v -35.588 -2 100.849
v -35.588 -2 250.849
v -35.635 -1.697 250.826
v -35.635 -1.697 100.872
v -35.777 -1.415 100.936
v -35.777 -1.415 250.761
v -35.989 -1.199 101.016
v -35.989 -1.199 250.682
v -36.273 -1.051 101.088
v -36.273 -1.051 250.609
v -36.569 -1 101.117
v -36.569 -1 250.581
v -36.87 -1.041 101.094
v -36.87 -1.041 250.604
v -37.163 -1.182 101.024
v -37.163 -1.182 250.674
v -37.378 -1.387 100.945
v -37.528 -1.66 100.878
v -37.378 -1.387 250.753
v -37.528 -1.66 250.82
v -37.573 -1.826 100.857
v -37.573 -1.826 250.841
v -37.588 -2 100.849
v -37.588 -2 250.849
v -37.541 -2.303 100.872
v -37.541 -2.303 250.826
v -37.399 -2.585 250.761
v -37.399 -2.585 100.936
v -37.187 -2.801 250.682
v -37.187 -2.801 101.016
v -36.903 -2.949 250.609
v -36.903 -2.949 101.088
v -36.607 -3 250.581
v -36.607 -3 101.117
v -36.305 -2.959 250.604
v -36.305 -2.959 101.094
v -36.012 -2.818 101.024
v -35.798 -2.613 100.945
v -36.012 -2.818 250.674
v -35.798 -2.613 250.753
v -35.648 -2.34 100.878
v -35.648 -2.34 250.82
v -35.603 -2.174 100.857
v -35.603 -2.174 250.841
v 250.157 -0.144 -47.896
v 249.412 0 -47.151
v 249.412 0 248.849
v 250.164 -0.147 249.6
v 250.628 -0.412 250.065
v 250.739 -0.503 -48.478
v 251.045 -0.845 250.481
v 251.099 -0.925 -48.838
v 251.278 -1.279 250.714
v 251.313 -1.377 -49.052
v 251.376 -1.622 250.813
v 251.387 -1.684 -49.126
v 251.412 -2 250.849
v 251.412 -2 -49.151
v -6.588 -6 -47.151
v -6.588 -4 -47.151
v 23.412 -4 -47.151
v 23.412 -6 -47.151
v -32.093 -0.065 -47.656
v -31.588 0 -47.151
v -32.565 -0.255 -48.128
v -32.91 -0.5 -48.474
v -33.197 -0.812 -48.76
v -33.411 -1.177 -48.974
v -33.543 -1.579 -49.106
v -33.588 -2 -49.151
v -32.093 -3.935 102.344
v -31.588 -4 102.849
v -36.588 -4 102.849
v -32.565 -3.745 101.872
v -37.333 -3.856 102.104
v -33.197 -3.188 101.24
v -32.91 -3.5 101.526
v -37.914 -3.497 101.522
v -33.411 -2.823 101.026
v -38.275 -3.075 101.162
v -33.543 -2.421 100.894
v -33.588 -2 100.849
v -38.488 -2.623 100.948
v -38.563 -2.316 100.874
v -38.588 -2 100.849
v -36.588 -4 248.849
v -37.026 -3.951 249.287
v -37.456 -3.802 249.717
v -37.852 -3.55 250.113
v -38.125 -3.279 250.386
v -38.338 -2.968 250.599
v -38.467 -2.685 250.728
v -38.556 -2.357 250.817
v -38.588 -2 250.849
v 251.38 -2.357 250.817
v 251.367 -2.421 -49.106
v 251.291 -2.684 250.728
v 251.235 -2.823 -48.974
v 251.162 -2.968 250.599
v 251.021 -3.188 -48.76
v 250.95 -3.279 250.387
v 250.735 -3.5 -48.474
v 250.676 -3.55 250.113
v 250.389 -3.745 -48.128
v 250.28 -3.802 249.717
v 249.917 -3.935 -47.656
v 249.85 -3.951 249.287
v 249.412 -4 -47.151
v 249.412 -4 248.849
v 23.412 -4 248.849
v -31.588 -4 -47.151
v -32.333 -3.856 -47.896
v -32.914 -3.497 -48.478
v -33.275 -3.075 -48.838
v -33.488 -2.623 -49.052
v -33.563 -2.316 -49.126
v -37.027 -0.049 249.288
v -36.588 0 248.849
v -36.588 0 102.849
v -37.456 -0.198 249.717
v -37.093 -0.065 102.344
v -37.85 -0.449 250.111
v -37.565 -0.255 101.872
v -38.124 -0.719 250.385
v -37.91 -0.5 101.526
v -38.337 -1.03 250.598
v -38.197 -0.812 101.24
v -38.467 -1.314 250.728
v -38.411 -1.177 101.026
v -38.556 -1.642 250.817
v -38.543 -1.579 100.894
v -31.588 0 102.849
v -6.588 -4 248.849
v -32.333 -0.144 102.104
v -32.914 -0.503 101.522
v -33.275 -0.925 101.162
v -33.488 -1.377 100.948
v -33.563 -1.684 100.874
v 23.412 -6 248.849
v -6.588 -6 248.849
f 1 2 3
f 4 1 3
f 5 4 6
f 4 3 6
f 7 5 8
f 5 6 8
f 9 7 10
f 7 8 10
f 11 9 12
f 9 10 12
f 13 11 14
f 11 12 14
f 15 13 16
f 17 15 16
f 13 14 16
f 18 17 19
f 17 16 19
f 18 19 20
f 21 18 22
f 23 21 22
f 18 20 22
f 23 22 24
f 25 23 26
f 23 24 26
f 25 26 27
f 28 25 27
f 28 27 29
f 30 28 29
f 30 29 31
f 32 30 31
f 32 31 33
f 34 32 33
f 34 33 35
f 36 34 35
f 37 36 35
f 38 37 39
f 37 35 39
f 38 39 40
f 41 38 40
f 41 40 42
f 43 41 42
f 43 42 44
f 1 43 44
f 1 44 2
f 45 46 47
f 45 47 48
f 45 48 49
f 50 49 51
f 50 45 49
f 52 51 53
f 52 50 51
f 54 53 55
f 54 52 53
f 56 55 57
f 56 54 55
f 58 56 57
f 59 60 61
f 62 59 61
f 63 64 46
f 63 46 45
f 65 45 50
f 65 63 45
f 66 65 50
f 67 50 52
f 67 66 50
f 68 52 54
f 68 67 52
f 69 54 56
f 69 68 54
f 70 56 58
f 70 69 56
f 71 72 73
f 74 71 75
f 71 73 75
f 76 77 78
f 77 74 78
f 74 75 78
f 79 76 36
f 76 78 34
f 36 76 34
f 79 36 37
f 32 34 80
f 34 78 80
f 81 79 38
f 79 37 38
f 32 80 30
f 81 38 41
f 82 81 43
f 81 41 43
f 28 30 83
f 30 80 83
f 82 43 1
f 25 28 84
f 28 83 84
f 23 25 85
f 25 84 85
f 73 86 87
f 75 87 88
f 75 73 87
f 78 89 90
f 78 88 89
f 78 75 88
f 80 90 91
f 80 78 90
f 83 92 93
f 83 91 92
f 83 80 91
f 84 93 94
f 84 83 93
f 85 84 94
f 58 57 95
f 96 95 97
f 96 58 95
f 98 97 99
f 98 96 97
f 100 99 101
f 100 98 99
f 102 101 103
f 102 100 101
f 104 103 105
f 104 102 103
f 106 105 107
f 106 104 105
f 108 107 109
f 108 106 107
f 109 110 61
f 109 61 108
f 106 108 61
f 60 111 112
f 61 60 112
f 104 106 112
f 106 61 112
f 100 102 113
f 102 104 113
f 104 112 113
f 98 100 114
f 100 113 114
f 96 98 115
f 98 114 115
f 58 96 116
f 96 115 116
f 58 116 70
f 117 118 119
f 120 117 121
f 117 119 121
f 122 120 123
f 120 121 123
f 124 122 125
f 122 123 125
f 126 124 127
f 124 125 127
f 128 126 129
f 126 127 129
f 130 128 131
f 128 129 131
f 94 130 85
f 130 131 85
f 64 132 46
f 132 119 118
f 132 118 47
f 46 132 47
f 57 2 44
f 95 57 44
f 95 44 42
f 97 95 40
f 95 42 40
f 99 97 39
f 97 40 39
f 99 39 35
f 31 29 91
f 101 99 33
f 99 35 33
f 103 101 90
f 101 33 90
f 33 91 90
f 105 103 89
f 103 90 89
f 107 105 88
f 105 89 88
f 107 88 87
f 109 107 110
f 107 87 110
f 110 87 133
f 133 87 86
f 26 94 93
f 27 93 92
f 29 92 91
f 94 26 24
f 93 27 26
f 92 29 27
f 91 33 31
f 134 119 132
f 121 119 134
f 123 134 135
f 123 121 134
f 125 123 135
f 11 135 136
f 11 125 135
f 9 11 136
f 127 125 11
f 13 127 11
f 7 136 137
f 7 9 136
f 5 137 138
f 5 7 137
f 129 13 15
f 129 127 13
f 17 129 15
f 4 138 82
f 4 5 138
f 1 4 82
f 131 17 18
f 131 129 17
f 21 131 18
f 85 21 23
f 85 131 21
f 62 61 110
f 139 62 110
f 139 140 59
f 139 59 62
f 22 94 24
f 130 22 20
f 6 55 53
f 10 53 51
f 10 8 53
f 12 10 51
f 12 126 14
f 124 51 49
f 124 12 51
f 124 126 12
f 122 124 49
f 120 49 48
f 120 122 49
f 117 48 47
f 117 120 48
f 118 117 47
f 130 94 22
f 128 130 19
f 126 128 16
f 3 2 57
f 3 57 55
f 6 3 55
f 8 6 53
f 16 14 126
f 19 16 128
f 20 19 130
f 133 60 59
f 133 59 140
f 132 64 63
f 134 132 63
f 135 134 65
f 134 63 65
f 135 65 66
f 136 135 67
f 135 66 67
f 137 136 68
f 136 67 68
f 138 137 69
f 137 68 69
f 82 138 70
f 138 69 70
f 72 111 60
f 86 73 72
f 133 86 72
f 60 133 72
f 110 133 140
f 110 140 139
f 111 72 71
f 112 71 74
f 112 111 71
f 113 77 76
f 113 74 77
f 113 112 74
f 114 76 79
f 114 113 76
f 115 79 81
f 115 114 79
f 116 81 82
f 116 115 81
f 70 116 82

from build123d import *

# Parameters (mm, degrees)
F1_DEPTH     = 4
F2_R         = 1
F3_DEPTH     = 310
F4_T1_DEPTH  = 300
F4_T3_DEPTH  = 160
F4_T5_DEPTH  = 10
F4_T7_DEPTH  = 155
F4_T9_DEPTH  = 295
F4_T11_DEPTH = 310
F4_T17_DEPTH = 15
F4_T21_DEPTH = 160
F5_T1_DEPTH  = 300
F5_T3_DEPTH  = 160
F5_T5_DEPTH  = 10
F5_T7_DEPTH  = 155
F5_T9_DEPTH  = 295
F5_T11_DEPTH = 310
F5_T17_DEPTH = 15
F5_T21_DEPTH = 160
F6_W         = 30
F6_H         = 296
F7_DEPTH     = 2


# Not quite as in the source:
# - a fillet or chamfer that OpenCascade refuses, or shapes differently, is made with other operations: its cross-section is extruded or revolved along the edge and cut away or added


with BuildPart() as f1:
    # F0 (on Front) → F1 (new body)
    with BuildSketch(Plane.XZ):
        Polygon((251.4121359825, 250.8489221025), (-38.5878640175, 250.8489221025), (-38.5878640175, 100.8489221025), (-33.5878640175, 100.8489221025), (-33.5878640175, -49.1510778975), (251.4121359825, -49.1510778975), align=None)
    extrude(amount=F1_DEPTH)

    # F2 (on face) → F3 (cut)
    with BuildSketch(Plane.XY.offset(250.8489221025)):
        with Locations((-36.5878640175, -2)):
            Circle(F2_R)
    extrude(amount=-F3_DEPTH, mode=Mode.SUBTRACT)

    # F4: fillet of radius 2 on 6 edges, made by hand

    # F4_s2 → F4_t1 (cut)
    with BuildSketch(Plane.YZ.offset(-43.5878640175)):
        with BuildLine():
            ThreePointArc((-2, 250.8489221025), (-3.4142135624, 250.2631356648), (-4, 248.8489221025))
            Line((-4, 248.8489221025), (-4, 250.8489221025))
            Line((-4, 250.8489221025), (-2, 250.8489221025))
        make_face()
    extrude(amount=F4_T1_DEPTH, mode=Mode.SUBTRACT)

    # F4_s4 → F4_t3 (cut)
    with BuildSketch(Plane.XY.offset(95.8489221025)):
        with BuildLine():
            ThreePointArc((-36.5878640175, -4), (-38.0020775799, -3.4142135624), (-38.5878640175, -2))
            Line((-38.5878640175, -2), (-38.5878640175, -4))
            Line((-38.5878640175, -4), (-36.5878640175, -4))
        make_face()
    extrude(amount=F4_T3_DEPTH, mode=Mode.SUBTRACT)

    # F4_s6 → F4_t5 (cut)
    with BuildSketch(Plane.YZ.offset(-43.5878640175)):
        with BuildLine():
            ThreePointArc((-4, 102.8489221025), (-3.4142135624, 101.4347085401), (-2, 100.8489221025))
            Line((-2, 100.8489221025), (-4, 100.8489221025))
            Line((-4, 100.8489221025), (-4, 102.8489221025))
        make_face()
    extrude(amount=F4_T5_DEPTH, mode=Mode.SUBTRACT)

    # F4_s8 → F4_t7 (cut)
    with BuildSketch(Plane.XY.offset(-54.1510778975)):
        with BuildLine():
            ThreePointArc((-31.5878640175, -4), (-33.0020775799, -3.4142135624), (-33.5878640175, -2))
            Line((-33.5878640175, -2), (-33.5878640175, -4))
            Line((-33.5878640175, -4), (-31.5878640175, -4))
        make_face()
    extrude(amount=F4_T7_DEPTH, mode=Mode.SUBTRACT)

    # F4_s10 → F4_t9 (cut)
    with BuildSketch(Plane.YZ.offset(-38.5878640175)):
        with BuildLine():
            ThreePointArc((-4, -47.1510778975), (-3.4142135624, -48.5652914599), (-2, -49.1510778975))
            Line((-2, -49.1510778975), (-4, -49.1510778975))
            Line((-4, -49.1510778975), (-4, -47.1510778975))
        make_face()
    extrude(amount=F4_T9_DEPTH, mode=Mode.SUBTRACT)

    # F4_s12 → F4_t11 (cut)
    with BuildSketch(Plane.XY.offset(-54.1510778975)):
        with BuildLine():
            ThreePointArc((251.4121359825, -2), (250.8263495449, -3.4142135624), (249.4121359825, -4))
            Line((249.4121359825, -4), (251.4121359825, -4))
            Line((251.4121359825, -4), (251.4121359825, -2))
        make_face()
    extrude(amount=F4_T11_DEPTH, mode=Mode.SUBTRACT)


with BuildPart() as f4_tool15:
    # F4_s16 → F4_t17 (new body)
    with BuildSketch(Plane.YZ.offset(-43.5878640175)):
        with BuildLine():
            ThreePointArc((-4, 102.8489221025), (-3.4142135624, 101.4347085401), (-2, 100.8489221025))
            Line((-2, 100.8489221025), (-4, 100.8489221025))
            Line((-4, 100.8489221025), (-4, 102.8489221025))
        make_face()
    extrude(amount=F4_T17_DEPTH)

    split(bisect_by=Plane.YZ.offset(-33.5878640175), keep=Keep.TOP)


with BuildPart() as f4_tool19:
    # F4_s20 → F4_t21 (new body)
    with BuildSketch(Plane.XY.offset(105.8489221025)):
        with BuildLine():
            ThreePointArc((-31.5878640175, -4), (-33.0020775799, -3.4142135624), (-33.5878640175, -2))
            Line((-33.5878640175, -2), (-33.5878640175, -4))
            Line((-33.5878640175, -4), (-31.5878640175, -4))
        make_face()
    extrude(amount=-F4_T21_DEPTH)

    split(bisect_by=Plane.XY.offset(100.8489221025), keep=Keep.TOP)


with BuildPart() as f4_tool15_1:
    add(f4_tool15.part)

    # F4_t23: intersect F4_tool19
    add(f4_tool19.part, mode=Mode.INTERSECT)


with BuildPart() as f1_1:
    add(f1.part)

    # F4_t13: cut F4_tool15
    add(f4_tool15_1.part, mode=Mode.SUBTRACT)

    # F5: fillet of radius 2 on 6 edges, made by hand

    # F5_s2 → F5_t1 (cut)
    with BuildSketch(Plane.YZ.offset(-43.5878640175)):
        with BuildLine():
            ThreePointArc((-2, 250.8489221025), (-0.5857864376, 250.2631356648), (0, 248.8489221025))
            Line((0, 248.8489221025), (0, 250.8489221025))
            Line((0, 250.8489221025), (-2, 250.8489221025))
        make_face()
    extrude(amount=F5_T1_DEPTH, mode=Mode.SUBTRACT)

    # F5_s4 → F5_t3 (cut)
    with BuildSketch(Plane.XY.offset(95.8489221025)):
        with BuildLine():
            ThreePointArc((-36.5878640175, 0), (-38.0020775799, -0.5857864376), (-38.5878640175, -2))
            Line((-38.5878640175, -2), (-38.5878640175, 0))
            Line((-38.5878640175, 0), (-36.5878640175, 0))
        make_face()
    extrude(amount=F5_T3_DEPTH, mode=Mode.SUBTRACT)

    # F5_s6 → F5_t5 (cut)
    with BuildSketch(Plane.YZ.offset(-43.5878640175)):
        with BuildLine():
            ThreePointArc((0, 102.8489221025), (-0.5857864376, 101.4347085401), (-2, 100.8489221025))
            Line((-2, 100.8489221025), (0, 100.8489221025))
            Line((0, 100.8489221025), (0, 102.8489221025))
        make_face()
    extrude(amount=F5_T5_DEPTH, mode=Mode.SUBTRACT)

    # F5_s8 → F5_t7 (cut)
    with BuildSketch(Plane.XY.offset(-54.1510778975)):
        with BuildLine():
            ThreePointArc((-31.5878640175, 0), (-33.0020775799, -0.5857864376), (-33.5878640175, -2))
            Line((-33.5878640175, -2), (-33.5878640175, 0))
            Line((-33.5878640175, 0), (-31.5878640175, 0))
        make_face()
    extrude(amount=F5_T7_DEPTH, mode=Mode.SUBTRACT)

    # F5_s10 → F5_t9 (cut)
    with BuildSketch(Plane.YZ.offset(-38.5878640175)):
        with BuildLine():
            ThreePointArc((0, -47.1510778975), (-0.5857864376, -48.5652914599), (-2, -49.1510778975))
            Line((-2, -49.1510778975), (0, -49.1510778975))
            Line((0, -49.1510778975), (0, -47.1510778975))
        make_face()
    extrude(amount=F5_T9_DEPTH, mode=Mode.SUBTRACT)

    # F5_s12 → F5_t11 (cut)
    with BuildSketch(Plane.XY.offset(-54.1510778975)):
        with BuildLine():
            ThreePointArc((249.4121359825, 0), (250.8263495449, -0.5857864376), (251.4121359825, -2))
            Line((251.4121359825, -2), (251.4121359825, 0))
            Line((251.4121359825, 0), (249.4121359825, 0))
        make_face()
    extrude(amount=F5_T11_DEPTH, mode=Mode.SUBTRACT)


with BuildPart() as f5_tool15:
    # F5_s16 → F5_t17 (new body)
    with BuildSketch(Plane.YZ.offset(-43.5878640175)):
        with BuildLine():
            ThreePointArc((0, 102.8489221025), (-0.5857864376, 101.4347085401), (-2, 100.8489221025))
            Line((-2, 100.8489221025), (0, 100.8489221025))
            Line((0, 100.8489221025), (0, 102.8489221025))
        make_face()
    extrude(amount=F5_T17_DEPTH)

    split(bisect_by=Plane.YZ.offset(-33.5878640175), keep=Keep.TOP)


with BuildPart() as f5_tool19:
    # F5_s20 → F5_t21 (new body)
    with BuildSketch(Plane.XY.offset(105.8489221025)):
        with BuildLine():
            ThreePointArc((-31.5878640175, 0), (-33.0020775799, -0.5857864376), (-33.5878640175, -2))
            Line((-33.5878640175, -2), (-33.5878640175, 0))
            Line((-33.5878640175, 0), (-31.5878640175, 0))
        make_face()
    extrude(amount=-F5_T21_DEPTH)

    split(bisect_by=Plane.XY.offset(100.8489221025), keep=Keep.TOP)


with BuildPart() as f5_tool15_1:
    add(f5_tool15.part)

    # F5_t23: intersect F5_tool19
    add(f5_tool19.part, mode=Mode.INTERSECT)


with BuildPart() as f1_2:
    add(f1_1.part)

    # F5_t13: cut F5_tool15
    add(f5_tool15_1.part, mode=Mode.SUBTRACT)

    # F6 (on face) → F7 (join)
    with BuildSketch(Plane.XZ.offset(4)):
        with Locations((8.4121359825, 100.8489221025)):
            Rectangle(F6_W, F6_H)
    extrude(amount=F7_DEPTH)


solid = f1_2.part
